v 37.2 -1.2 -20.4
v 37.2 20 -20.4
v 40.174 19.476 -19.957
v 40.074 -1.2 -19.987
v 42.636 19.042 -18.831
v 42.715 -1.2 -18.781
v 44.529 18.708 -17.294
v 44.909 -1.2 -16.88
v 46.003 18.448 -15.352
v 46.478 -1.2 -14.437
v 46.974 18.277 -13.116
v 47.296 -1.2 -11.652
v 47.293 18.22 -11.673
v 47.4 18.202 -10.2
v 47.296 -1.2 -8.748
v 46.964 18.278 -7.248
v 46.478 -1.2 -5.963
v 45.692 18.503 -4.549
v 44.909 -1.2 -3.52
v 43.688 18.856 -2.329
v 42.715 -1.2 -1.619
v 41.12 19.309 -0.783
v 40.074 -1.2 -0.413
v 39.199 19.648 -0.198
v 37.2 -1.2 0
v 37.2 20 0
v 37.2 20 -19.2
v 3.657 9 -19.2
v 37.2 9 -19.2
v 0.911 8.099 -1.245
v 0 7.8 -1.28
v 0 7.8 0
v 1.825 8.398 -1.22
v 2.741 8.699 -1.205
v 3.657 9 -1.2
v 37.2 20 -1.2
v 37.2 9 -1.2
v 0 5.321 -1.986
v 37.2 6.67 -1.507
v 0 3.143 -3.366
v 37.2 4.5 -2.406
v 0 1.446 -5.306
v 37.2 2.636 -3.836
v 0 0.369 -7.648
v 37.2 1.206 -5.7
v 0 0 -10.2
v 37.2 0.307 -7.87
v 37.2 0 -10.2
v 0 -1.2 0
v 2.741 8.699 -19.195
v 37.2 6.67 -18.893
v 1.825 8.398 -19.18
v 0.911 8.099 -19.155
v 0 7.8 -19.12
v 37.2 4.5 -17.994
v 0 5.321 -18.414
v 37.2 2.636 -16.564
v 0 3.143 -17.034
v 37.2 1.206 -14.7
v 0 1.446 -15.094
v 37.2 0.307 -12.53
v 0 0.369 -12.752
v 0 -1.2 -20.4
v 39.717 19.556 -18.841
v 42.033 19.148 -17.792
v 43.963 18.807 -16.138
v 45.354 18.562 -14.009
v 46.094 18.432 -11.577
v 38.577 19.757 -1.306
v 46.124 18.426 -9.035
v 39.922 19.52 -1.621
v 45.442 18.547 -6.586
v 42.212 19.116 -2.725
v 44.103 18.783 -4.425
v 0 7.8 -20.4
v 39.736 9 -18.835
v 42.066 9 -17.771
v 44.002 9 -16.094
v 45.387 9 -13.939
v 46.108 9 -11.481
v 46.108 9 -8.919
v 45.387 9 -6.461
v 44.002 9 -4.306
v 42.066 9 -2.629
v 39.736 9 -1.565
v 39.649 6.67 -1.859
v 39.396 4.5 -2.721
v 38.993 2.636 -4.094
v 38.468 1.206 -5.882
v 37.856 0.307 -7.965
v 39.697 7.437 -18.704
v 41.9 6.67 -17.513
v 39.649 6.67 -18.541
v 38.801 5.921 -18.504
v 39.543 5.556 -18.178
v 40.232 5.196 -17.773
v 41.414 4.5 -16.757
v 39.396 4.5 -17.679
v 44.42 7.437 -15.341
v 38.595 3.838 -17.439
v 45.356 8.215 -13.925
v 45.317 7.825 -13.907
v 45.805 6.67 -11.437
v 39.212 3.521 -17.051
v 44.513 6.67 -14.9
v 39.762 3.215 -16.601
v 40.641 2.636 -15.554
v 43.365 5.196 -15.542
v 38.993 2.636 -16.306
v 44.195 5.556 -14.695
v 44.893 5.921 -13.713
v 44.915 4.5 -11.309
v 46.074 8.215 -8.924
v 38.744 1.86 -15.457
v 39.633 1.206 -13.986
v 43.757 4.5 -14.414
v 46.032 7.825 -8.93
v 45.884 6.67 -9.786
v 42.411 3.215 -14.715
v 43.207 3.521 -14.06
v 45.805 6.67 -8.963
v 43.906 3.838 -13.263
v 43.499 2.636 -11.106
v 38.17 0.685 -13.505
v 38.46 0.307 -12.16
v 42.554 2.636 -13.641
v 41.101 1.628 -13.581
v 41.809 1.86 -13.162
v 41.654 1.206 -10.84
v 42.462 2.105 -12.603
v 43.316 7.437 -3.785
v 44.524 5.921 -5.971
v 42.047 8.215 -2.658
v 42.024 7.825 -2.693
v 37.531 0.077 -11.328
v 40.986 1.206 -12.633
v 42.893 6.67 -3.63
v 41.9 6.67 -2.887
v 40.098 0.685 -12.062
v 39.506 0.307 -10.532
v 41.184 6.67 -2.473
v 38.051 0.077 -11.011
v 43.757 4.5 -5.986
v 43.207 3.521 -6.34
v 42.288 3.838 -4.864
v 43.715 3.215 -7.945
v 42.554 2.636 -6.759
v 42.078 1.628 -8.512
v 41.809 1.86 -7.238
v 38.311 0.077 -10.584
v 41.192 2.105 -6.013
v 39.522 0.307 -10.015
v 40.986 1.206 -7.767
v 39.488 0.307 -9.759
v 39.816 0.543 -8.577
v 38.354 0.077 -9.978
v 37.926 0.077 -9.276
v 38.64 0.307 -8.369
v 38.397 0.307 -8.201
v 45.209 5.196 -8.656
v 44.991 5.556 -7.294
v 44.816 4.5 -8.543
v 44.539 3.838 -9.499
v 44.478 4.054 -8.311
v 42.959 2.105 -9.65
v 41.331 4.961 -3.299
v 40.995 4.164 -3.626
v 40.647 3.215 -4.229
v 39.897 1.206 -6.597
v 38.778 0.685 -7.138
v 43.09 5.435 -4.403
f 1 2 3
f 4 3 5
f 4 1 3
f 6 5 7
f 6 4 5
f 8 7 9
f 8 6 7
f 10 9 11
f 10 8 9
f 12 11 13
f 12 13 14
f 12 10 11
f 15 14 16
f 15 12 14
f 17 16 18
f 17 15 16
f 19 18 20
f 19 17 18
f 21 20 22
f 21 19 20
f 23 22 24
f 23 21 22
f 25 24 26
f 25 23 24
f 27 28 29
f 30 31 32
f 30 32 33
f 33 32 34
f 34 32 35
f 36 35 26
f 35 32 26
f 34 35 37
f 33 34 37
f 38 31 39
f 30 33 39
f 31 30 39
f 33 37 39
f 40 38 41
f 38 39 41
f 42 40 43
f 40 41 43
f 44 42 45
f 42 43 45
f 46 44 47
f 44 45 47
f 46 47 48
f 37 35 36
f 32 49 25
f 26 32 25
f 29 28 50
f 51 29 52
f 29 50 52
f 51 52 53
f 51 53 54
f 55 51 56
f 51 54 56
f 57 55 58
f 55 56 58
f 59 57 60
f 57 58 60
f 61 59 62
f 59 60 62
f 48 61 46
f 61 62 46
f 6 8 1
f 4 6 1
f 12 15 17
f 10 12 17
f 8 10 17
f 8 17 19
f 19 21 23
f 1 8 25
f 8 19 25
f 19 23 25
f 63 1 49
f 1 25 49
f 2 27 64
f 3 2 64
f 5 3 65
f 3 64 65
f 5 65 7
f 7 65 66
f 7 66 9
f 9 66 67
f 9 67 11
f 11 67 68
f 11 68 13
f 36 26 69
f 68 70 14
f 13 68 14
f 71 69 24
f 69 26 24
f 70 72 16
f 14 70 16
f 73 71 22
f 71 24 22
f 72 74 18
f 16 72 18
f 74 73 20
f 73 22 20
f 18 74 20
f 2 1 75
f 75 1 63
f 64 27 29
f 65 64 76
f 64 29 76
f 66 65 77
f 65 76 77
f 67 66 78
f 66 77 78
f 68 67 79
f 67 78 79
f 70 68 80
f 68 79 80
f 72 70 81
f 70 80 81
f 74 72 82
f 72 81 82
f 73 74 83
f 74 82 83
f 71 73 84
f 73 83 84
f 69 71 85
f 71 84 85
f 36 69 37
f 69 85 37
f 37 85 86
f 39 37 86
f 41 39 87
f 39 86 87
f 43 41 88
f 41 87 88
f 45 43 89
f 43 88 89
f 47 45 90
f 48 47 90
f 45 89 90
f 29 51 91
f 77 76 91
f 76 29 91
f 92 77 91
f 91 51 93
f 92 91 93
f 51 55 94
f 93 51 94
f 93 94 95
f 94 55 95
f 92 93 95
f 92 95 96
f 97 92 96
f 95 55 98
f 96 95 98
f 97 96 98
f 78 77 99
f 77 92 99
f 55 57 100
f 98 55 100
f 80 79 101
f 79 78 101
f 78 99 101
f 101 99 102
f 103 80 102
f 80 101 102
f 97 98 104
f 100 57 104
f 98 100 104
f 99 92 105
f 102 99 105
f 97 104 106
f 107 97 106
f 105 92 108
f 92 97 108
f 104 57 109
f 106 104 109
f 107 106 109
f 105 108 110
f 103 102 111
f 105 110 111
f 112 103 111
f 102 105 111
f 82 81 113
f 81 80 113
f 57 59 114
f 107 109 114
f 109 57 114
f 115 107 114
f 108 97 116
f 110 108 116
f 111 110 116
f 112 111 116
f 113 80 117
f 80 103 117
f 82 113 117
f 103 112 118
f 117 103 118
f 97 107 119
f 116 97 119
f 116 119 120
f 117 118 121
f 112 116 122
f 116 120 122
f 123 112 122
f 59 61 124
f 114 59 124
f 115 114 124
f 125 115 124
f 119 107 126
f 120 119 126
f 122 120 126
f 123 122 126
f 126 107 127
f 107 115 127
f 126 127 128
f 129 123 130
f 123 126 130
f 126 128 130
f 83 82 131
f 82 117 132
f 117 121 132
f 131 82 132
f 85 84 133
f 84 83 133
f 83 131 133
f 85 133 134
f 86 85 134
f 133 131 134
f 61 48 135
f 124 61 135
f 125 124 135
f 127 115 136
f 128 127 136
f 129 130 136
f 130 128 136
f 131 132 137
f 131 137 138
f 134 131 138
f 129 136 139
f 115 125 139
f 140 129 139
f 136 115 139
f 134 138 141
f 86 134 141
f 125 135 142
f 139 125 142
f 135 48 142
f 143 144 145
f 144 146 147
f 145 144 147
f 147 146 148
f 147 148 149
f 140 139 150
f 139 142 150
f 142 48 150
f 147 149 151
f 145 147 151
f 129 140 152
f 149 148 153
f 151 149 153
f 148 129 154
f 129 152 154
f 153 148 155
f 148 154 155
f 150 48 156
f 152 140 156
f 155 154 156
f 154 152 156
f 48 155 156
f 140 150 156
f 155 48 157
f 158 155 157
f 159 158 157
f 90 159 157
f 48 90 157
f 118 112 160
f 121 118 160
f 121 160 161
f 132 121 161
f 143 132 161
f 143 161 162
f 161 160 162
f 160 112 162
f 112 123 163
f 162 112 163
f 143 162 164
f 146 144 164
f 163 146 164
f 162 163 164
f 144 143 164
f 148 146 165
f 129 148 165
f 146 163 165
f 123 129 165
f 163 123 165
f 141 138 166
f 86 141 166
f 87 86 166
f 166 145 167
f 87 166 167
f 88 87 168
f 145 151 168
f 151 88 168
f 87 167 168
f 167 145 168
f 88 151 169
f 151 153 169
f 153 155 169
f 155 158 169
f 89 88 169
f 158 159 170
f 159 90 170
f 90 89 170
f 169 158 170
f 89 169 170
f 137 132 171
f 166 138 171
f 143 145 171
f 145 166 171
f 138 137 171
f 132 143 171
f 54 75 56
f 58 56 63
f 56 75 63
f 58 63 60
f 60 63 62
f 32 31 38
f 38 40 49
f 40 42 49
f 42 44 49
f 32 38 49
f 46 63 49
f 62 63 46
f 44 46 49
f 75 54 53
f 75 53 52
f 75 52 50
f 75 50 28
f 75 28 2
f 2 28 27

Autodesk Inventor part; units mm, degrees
ref_plane "YZ Plane" through (0, 0, 0) normal (1, 0, 0) x (0, 1, 0)
ref_plane "XZ Plane" through (0, 0, 0) normal (0, 1, 0) x (-1, 0, 0)
ref_plane "XY Plane" through (0, 0, 0) normal (0, 0, 1) x (1, 0, 0)
sketch "Esboço1" plane through (0, 0, 0) normal (0, 1, 0) x (-1, 0, 0)
  line L0 (-1.2, -1.2) -> (-37.2, -1.2)
  line L1 (-1.2, -19.2) -> (-1.2, -1.2)
  arc A0 (-37.2, -1.2) -> (-37.2, -19.2) centre (-37.2, -10.2) ccw
  line L2 (-1.2, -19.2) -> (-37.2, -19.2)
  line L3 (-37.2, -20.4) -> (0, -20.4)
  line L4 (0, -20.4) -> (0, 0)
  line L5 (0, 0) -> (-37.2, 0)
  arc A1 (-37.2, 0) -> (-37.2, -20.4) centre (-37.2, -10.2) ccw
  line L6 (-1.2, -1.2) -> (0, -1.2)
  line L7 (-1.2, -19.2) -> (0, -19.2)
  point P0 (-1.2, -10.2)
  dimension "d0" = 18
  dimension "d3" = 18
  dimension "d5" = 36
  dimension "d6" = 1.2
extrude "Extrusão1" add sketch "Esboço1" against normal blind 1.2
extrude "Extrusão2" add sketch "Esboço1" along normal blind 20 contours L0 A0 L2 L7 L4 L3 A1 L5 L6
fillet "Arredondamento1" radius 9 3 edges at (46.2, 0, -10.2) (18.6, 0, -1.2) (18.6, 0, -19.2)
sketch "Esboço2" plane through (0, -1.2, 0) normal (0, 0, 1) x (1, 0, 0)
  line L0 (37.2, 21.2) -> (46.2, 21.2) projected
  line L1 (37.2, 0) -> (0, 0) projected
  line L2 (37.2, 1.2) -> (37.2, 21.2) projected
  line L3 (0, 21.2) -> (0, 0) projected
  line L4 (47.4, 21.2) -> (37.2, 21.2) projected
  line L5 (0, 9) -> (37.2, 21.2)
  line L6 (37.2, 21.2) -> (0, 21.2)
  line L7 (0, 21.2) -> (37.2, 21.2) projected
  line L8 (37.2, 21.2) -> (47.4, 19.4015)
  line L9 (47.4, 21.2) -> (47.4, 0) projected
  line L10 (37.2, 21.2) -> (47.5574, 21.2) construction
  line L11 (47.4, 19.4015) -> (47.4, 21.2)
  line L12 (47.4, 21.2) -> (47.4, 0) projected
  line L13 (37.2, 21.2) -> (47.4, 21.2)
  line L14 (0, 9) -> (0, 21.2)
  point P0 (0, 1.2)
  point P1 (0, 10.6)
  point P2 (0, 10.6)
  dimension "d13" = 9
  dimension "d16" = 10
extrude "Extrusão3" cut sketch "Esboço2" against normal up to surface (20.4 mm away)
equation "\"d0\" = Diâmetro_esfera"
equation "\"d3\" = Diâmetro_esfera"
equation "\"d5\" = 2 * Diâmetro_esfera"
equation "\"d6\" = Margem"
equation "\"d7\" = Margem"
equation "\"d11\" = 0.5 * Diâmetro_esfera"
equation "\"d13\" = 0.5 * Diâmetro_esfera"
equation "\"Diâmetro_esfera\" = 18"
equation "\"Filamento\" = 0.4"
equation "\"Margem\" = 3 * Filamento"
equation "\"Parafuso\" = 3"
properties part number "Receptor pequeno" material "Plástico PET"
